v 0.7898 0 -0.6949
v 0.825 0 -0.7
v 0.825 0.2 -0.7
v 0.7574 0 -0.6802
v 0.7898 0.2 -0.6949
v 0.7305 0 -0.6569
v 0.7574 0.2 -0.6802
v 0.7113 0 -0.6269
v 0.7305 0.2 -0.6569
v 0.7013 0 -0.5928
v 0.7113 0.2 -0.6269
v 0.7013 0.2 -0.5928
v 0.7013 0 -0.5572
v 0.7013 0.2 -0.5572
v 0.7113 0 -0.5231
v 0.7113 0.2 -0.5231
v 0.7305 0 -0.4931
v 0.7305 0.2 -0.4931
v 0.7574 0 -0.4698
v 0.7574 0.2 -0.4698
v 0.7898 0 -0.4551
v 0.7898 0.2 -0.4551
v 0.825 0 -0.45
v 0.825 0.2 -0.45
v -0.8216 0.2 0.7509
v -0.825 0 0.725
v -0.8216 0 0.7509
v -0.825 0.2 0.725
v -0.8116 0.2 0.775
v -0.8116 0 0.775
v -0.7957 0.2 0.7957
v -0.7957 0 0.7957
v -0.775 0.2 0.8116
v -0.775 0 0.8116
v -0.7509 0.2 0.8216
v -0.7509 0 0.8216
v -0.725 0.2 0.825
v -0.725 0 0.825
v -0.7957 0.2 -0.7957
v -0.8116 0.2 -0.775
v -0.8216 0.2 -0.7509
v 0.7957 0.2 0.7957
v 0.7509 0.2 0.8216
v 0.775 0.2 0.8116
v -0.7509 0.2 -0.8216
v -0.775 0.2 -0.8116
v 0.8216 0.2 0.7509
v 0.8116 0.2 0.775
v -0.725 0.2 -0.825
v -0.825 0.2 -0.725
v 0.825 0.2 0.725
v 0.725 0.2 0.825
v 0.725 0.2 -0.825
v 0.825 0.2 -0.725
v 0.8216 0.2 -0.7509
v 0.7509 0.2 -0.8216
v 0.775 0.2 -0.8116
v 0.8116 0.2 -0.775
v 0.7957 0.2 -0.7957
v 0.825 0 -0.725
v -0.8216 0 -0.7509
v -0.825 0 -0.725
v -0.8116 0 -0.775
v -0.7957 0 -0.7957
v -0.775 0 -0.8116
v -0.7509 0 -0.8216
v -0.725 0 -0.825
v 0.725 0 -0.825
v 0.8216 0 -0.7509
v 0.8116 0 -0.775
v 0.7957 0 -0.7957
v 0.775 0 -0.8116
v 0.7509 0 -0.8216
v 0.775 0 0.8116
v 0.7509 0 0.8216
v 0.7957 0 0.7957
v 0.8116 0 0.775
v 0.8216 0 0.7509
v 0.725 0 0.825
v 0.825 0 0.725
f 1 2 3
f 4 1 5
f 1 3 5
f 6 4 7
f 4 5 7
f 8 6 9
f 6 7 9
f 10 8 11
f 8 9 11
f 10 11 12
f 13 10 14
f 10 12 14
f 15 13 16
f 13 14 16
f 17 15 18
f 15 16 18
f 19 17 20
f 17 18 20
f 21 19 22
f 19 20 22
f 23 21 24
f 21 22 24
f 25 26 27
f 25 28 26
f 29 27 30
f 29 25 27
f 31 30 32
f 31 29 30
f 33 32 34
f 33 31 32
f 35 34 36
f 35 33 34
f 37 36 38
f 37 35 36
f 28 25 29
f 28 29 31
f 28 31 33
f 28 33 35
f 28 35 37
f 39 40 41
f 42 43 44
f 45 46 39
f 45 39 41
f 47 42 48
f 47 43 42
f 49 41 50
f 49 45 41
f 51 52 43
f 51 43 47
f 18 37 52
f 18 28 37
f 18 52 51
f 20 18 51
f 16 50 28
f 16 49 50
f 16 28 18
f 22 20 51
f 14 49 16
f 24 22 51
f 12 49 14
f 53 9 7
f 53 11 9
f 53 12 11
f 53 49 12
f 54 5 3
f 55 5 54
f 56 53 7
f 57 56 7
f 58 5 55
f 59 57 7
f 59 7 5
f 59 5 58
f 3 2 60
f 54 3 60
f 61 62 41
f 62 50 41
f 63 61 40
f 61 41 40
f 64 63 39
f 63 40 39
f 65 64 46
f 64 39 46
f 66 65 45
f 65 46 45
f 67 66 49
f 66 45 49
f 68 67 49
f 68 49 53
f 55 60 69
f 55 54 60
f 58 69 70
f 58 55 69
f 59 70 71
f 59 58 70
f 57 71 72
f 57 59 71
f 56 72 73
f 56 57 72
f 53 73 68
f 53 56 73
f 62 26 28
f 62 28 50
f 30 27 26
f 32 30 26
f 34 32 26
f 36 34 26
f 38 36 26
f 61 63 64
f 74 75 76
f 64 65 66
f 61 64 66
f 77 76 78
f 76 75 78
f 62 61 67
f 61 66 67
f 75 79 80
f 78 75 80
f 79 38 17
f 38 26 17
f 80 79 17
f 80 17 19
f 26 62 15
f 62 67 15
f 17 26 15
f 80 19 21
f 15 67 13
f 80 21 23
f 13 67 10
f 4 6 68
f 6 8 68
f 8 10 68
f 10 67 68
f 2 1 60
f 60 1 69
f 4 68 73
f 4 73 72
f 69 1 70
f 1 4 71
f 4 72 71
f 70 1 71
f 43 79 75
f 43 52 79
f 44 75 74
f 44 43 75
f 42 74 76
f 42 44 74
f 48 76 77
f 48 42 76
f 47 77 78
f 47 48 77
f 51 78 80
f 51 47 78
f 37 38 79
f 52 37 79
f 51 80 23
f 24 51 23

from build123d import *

# Parameters (mm, degrees)
SKETCH1_W           = 1.65
SKETCH1_H           = 1.65
BOSS_EXTRUDE1_DEPTH = 0.2
FILLET1_R           = 0.1
SKETCH2_R           = 0.125
CUT_EXTRUDE1_DEPTH  = 1.2


with BuildPart() as part:
    # Sketch1 → Boss-Extrude1 (new body)
    with BuildSketch(Plane(origin=(0, 0, 0), x_dir=(1, 0, 0), z_dir=(0, 1, 0))):
        Rectangle(SKETCH1_W, SKETCH1_H)
    extrude(amount=BOSS_EXTRUDE1_DEPTH)

    # Fillet1
    fillet1_edges = [part.edges().sort_by_distance(p)[0] for p in [
        (0.825, 0.1, 0.825),
        (-0.825, 0.1, 0.825),
        (-0.825, 0.1, -0.825),
        (0.825, 0.1, -0.825),
    ]]
    fillet(fillet1_edges, radius=FILLET1_R)

    # Sketch2 → Cut-Extrude1 (cut, through all)
    with BuildSketch(Plane(origin=(0, 0.2, 0), x_dir=(1, 0, 0), z_dir=(0, 1, 0))):
        with Locations((0.825, 0.575)):
            Circle(SKETCH2_R)
    extrude(amount=-CUT_EXTRUDE1_DEPTH, mode=Mode.SUBTRACT)


solid = part.part
